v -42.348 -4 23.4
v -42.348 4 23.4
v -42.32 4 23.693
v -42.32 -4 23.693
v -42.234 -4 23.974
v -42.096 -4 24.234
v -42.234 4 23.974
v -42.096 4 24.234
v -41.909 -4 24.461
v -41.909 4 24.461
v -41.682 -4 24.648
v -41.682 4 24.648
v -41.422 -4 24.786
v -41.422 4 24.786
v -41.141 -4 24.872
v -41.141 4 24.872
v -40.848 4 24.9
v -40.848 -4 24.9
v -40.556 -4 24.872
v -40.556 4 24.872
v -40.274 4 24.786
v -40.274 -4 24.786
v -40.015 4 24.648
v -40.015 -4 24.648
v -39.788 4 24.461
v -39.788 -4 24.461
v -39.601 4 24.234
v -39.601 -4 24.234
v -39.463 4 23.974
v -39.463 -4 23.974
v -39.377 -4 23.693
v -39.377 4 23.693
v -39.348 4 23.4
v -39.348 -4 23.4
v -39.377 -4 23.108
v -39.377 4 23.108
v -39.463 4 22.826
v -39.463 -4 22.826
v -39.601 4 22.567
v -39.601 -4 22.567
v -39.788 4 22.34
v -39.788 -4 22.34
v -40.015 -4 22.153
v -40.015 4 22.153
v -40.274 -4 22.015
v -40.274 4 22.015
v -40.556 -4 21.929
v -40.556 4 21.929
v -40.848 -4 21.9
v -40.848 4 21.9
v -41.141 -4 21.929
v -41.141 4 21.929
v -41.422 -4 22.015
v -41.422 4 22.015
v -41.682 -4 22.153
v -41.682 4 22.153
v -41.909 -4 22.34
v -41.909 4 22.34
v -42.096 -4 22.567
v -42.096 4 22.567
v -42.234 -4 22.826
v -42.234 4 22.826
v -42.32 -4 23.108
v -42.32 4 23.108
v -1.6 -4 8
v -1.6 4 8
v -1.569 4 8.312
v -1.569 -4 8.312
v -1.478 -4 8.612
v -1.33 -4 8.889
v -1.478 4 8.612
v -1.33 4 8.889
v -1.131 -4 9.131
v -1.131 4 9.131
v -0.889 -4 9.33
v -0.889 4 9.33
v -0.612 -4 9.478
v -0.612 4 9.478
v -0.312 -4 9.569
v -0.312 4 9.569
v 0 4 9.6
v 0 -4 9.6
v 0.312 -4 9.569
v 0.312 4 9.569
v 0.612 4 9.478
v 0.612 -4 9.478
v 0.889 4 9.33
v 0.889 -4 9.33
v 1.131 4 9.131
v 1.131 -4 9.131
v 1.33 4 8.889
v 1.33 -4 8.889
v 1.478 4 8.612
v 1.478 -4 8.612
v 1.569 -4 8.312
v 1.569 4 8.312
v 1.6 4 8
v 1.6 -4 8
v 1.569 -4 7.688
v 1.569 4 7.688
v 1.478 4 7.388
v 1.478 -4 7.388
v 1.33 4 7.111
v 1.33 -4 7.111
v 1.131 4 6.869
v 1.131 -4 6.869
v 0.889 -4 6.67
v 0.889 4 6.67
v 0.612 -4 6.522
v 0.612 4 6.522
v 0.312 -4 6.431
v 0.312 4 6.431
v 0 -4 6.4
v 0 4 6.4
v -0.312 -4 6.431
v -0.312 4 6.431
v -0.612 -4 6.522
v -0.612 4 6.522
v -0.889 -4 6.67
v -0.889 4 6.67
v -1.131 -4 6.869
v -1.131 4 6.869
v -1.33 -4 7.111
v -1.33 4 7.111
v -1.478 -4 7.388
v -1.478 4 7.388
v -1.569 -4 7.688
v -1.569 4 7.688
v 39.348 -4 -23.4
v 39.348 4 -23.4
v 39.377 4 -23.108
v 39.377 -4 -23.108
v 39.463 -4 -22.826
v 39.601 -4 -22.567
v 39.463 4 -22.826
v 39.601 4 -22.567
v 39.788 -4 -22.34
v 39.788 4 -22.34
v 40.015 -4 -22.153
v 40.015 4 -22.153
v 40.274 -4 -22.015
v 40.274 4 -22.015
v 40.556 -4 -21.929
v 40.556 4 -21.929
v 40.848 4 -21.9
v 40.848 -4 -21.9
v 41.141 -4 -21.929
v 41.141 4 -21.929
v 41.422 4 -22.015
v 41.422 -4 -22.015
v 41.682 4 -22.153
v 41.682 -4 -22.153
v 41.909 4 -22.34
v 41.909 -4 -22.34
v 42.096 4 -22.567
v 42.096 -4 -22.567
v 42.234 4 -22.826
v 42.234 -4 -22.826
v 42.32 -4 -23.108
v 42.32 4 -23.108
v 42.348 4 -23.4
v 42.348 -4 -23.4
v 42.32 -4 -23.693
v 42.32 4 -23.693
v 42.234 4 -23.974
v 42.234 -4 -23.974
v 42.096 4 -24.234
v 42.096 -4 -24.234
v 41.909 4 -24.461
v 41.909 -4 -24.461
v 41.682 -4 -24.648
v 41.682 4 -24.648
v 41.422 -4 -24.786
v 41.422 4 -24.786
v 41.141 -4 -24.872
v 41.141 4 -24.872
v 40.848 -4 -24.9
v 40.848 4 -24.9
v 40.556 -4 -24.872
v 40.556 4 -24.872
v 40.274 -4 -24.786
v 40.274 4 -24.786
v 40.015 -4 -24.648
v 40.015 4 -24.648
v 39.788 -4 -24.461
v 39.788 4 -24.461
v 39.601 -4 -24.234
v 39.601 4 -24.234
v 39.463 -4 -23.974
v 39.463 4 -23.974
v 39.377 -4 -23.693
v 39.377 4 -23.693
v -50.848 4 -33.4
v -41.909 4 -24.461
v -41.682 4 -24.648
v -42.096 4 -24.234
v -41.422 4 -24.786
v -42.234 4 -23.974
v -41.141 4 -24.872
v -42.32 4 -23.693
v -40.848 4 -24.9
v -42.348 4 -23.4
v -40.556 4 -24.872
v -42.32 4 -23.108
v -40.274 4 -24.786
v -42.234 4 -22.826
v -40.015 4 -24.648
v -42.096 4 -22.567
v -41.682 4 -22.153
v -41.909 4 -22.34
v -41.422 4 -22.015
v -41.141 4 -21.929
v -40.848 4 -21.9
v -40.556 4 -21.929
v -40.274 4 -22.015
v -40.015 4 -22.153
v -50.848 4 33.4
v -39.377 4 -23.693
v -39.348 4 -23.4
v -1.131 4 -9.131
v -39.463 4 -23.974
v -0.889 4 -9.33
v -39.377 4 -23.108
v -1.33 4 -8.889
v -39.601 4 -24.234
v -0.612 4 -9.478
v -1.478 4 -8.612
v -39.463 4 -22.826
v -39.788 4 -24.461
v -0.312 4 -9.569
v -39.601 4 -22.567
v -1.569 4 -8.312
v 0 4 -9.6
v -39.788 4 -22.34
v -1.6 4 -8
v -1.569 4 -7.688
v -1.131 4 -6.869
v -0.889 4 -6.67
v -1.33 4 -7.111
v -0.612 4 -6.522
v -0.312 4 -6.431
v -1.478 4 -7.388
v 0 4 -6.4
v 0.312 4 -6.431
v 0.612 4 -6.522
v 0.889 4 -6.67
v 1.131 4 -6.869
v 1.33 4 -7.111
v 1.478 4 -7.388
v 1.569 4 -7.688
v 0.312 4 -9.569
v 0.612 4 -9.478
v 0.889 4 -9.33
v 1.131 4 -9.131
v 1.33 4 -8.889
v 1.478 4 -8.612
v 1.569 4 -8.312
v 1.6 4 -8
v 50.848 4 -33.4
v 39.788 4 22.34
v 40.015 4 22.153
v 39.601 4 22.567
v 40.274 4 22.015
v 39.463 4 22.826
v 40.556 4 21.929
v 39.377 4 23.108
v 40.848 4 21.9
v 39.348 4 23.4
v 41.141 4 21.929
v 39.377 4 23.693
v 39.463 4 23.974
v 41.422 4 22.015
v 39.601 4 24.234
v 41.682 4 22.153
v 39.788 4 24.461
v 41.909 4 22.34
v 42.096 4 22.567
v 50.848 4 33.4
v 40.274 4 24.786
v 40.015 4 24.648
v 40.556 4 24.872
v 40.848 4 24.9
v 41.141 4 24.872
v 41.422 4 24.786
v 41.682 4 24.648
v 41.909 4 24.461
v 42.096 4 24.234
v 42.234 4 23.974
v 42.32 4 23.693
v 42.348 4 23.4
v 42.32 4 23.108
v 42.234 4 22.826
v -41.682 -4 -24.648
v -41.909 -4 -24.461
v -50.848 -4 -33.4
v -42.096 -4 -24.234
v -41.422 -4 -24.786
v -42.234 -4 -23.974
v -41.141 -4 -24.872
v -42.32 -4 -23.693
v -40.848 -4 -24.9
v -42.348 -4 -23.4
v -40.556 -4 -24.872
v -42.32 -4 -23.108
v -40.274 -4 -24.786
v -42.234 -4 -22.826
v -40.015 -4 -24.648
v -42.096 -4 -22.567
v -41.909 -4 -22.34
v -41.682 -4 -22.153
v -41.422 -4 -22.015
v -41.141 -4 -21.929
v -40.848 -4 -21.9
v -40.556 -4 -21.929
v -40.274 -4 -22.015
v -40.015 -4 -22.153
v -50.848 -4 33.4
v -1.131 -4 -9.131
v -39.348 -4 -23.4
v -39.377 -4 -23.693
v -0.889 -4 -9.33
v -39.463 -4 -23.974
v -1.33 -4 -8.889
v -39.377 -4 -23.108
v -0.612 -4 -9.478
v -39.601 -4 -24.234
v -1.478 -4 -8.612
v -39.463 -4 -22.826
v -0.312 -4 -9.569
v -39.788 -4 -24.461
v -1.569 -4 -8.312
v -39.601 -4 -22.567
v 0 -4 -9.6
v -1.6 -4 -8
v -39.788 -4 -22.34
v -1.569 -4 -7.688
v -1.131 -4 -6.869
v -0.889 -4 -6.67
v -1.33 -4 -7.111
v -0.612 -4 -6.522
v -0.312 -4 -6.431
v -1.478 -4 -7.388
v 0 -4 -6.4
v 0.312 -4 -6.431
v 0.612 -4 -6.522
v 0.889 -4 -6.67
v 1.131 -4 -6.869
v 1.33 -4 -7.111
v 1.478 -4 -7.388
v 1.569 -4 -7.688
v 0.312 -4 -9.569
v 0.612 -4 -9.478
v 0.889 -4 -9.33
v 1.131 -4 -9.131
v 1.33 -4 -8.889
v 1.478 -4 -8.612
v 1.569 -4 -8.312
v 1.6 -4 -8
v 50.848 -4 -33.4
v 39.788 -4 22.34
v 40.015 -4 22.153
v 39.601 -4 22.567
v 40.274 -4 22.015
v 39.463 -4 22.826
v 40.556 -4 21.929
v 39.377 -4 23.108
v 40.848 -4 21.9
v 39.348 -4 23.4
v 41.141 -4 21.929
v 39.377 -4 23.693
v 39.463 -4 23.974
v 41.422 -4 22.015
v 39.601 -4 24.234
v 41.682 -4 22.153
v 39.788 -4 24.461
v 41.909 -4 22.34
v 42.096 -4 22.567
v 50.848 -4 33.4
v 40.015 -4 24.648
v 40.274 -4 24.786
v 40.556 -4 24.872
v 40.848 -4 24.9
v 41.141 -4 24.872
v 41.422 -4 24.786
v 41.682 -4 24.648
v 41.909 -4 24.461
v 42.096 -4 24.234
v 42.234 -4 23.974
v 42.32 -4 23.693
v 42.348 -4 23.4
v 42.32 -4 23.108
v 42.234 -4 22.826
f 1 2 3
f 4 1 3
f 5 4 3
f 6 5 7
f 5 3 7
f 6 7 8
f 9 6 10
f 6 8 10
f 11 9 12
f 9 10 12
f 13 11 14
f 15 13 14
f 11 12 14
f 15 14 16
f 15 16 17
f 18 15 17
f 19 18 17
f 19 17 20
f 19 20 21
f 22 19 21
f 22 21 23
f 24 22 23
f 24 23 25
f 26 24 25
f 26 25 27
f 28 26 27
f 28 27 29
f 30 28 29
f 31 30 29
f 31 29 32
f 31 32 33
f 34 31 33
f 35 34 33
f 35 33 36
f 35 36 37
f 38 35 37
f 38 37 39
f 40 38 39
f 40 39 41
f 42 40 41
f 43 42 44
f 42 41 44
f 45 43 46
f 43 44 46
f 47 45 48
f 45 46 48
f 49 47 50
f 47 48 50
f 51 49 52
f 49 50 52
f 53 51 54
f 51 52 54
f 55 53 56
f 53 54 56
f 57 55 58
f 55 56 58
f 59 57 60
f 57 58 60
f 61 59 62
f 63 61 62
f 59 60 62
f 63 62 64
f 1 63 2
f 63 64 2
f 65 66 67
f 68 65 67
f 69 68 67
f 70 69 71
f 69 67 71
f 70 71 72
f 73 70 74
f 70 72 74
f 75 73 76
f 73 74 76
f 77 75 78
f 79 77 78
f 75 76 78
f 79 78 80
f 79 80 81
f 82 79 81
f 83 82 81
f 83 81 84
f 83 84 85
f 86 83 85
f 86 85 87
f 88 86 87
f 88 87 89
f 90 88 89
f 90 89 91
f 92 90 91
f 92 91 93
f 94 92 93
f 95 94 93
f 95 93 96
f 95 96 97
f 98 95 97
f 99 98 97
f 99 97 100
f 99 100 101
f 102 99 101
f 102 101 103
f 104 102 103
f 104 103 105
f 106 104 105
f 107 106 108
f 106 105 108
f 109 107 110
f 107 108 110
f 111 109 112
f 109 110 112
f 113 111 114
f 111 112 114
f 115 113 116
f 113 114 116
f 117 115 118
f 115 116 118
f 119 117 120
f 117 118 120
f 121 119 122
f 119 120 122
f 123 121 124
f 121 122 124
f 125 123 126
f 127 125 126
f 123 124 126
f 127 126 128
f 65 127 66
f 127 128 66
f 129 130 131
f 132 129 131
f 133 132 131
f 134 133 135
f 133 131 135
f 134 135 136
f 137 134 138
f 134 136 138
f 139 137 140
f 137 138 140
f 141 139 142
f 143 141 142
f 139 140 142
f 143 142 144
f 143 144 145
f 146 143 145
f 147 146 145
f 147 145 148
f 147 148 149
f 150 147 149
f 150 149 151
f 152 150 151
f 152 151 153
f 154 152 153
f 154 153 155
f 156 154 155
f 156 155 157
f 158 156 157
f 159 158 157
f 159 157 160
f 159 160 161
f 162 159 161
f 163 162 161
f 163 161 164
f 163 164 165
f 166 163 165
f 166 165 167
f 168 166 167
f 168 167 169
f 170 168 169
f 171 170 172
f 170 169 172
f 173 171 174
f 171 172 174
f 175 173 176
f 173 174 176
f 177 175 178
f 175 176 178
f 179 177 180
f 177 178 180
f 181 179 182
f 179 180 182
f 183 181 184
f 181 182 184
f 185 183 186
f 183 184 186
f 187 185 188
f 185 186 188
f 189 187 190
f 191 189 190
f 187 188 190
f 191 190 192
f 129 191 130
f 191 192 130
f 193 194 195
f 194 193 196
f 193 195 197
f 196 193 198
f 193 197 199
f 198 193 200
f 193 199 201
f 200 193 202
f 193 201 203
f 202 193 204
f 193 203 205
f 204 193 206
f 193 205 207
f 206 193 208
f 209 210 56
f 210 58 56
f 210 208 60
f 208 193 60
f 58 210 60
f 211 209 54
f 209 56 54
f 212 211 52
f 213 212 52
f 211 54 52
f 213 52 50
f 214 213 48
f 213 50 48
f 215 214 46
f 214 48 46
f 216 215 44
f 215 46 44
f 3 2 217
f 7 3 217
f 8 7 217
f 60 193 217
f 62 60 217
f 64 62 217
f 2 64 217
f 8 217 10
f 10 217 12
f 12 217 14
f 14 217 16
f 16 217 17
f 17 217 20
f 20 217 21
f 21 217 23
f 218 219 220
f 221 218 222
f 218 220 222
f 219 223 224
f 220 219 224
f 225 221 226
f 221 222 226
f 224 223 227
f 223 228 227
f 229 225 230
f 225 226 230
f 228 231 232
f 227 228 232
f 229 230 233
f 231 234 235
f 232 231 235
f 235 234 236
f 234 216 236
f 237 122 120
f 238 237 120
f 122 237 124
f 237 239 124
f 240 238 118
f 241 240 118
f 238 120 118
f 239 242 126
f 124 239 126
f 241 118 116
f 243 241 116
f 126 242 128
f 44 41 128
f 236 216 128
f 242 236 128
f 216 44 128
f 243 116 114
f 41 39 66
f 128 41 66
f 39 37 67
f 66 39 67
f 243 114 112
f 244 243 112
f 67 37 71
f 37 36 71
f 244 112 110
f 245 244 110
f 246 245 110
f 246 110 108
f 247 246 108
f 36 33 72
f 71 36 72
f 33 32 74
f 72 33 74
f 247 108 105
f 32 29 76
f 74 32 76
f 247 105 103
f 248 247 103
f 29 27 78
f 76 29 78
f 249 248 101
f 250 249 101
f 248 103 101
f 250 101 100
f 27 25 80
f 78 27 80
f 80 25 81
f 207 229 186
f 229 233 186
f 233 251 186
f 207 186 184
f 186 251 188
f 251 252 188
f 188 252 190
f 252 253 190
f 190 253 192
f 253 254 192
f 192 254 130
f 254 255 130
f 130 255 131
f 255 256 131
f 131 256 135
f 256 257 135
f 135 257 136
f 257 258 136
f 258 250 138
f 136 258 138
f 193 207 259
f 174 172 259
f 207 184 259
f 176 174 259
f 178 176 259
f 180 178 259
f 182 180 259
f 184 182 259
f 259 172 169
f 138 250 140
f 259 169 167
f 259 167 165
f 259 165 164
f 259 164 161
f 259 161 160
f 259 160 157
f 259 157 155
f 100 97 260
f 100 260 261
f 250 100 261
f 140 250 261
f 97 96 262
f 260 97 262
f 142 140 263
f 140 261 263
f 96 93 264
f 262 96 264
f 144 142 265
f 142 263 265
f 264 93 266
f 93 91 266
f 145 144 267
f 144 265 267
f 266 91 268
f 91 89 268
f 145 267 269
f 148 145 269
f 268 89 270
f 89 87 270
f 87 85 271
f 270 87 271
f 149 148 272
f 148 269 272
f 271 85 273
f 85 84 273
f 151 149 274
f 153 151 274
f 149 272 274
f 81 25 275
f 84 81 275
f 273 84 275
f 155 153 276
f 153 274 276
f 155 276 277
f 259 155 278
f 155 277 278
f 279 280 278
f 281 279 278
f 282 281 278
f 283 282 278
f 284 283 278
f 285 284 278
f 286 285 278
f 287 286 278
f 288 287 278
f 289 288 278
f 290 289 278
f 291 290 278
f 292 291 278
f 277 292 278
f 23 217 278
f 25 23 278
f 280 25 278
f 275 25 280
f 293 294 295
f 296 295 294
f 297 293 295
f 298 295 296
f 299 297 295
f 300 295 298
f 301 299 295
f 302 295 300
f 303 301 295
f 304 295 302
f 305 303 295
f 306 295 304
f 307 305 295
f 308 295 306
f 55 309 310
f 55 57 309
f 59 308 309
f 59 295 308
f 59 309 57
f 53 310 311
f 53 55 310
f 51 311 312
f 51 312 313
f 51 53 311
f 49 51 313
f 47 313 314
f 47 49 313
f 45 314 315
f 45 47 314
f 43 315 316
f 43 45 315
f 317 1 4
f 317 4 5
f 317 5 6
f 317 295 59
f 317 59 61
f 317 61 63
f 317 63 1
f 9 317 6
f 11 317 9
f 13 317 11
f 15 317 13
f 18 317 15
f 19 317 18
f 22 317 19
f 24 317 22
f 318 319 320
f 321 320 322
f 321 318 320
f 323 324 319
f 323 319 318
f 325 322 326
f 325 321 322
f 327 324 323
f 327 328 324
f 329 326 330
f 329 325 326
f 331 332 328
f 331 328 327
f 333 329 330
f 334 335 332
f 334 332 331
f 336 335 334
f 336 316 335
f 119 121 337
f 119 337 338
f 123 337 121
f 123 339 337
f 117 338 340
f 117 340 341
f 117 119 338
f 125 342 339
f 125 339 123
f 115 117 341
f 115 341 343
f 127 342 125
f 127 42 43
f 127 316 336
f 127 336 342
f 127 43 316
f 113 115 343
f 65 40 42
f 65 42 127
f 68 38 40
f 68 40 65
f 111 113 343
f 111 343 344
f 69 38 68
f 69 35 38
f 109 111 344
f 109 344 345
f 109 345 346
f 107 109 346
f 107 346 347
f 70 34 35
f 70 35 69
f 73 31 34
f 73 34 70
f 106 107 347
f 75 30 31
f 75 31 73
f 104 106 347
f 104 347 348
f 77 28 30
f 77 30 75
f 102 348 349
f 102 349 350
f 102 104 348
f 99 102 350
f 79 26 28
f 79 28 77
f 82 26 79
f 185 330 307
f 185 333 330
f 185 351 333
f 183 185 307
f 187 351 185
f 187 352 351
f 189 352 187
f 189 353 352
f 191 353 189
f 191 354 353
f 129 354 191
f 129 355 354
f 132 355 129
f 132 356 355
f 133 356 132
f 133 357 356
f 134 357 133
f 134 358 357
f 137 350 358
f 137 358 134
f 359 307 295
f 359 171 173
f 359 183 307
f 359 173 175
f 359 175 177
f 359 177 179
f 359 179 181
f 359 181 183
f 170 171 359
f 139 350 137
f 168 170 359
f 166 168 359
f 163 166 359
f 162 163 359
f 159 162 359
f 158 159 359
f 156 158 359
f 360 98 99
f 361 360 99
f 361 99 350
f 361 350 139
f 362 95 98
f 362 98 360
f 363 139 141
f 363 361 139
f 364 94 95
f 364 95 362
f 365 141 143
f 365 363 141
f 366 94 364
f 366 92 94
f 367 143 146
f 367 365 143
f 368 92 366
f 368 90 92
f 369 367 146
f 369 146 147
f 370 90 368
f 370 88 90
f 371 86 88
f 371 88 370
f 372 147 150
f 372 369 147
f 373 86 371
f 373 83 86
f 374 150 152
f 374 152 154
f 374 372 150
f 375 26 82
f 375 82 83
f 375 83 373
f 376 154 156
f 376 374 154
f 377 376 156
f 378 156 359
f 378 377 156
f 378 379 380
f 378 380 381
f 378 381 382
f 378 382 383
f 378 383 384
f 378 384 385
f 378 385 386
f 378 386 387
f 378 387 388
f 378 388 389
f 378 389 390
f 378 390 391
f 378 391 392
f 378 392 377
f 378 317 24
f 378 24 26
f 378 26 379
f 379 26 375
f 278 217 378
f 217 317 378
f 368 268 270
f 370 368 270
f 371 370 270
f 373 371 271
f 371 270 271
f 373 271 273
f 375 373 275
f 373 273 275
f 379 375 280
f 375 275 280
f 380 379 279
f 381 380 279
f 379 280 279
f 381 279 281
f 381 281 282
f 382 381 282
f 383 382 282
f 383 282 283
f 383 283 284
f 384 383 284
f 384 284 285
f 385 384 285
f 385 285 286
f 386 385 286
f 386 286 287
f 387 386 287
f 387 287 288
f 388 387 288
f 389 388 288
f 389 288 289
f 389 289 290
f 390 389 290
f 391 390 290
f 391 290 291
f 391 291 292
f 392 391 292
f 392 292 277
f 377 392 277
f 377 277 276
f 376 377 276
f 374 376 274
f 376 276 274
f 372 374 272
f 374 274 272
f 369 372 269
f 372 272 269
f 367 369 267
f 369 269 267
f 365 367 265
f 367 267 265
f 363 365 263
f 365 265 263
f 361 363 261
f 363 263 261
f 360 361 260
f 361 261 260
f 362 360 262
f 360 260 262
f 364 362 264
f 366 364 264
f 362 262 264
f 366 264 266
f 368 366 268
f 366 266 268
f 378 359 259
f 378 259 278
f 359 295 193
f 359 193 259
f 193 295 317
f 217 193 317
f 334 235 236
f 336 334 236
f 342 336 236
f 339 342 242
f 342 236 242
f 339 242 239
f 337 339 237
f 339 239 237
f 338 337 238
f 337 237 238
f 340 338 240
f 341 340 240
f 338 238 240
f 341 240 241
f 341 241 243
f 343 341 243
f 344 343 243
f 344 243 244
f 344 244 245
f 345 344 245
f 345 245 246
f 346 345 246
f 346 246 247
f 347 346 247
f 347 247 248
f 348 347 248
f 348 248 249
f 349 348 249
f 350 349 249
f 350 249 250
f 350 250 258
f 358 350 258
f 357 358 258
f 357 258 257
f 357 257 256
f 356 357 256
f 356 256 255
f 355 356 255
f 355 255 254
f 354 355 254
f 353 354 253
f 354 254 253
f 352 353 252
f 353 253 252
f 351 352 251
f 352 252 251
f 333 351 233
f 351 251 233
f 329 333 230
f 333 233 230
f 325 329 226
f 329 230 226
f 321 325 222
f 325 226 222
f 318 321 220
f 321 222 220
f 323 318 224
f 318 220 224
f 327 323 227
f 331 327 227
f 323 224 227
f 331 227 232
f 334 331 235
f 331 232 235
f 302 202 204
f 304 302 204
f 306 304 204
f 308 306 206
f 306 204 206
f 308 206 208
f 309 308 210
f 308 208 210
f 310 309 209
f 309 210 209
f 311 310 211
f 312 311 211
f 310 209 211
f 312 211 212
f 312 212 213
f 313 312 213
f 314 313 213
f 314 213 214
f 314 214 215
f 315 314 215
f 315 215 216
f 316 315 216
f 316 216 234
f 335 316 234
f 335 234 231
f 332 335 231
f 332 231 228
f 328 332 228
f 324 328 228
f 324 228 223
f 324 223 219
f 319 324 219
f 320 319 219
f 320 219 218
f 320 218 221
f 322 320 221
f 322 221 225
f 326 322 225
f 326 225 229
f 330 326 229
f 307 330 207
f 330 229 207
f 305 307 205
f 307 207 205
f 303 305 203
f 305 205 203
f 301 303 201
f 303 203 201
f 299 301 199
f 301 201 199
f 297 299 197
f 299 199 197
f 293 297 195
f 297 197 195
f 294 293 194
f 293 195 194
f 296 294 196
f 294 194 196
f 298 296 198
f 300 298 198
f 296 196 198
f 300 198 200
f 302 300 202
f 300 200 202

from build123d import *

# Parameters (mm, degrees)
F0_W     = 101.69682
F0_H     = 66.800862
F1_DEPTH = 4
F3_D     = 3
F4_D     = 3.2


with BuildPart() as f1:
    # F0 (on Front) → F1 (new body, symmetric)
    with BuildSketch(Plane.XZ):
        Rectangle(F0_W, F0_H)
    extrude(amount=F1_DEPTH, both=True)

    # F3 (through all)
    with Locations(Plane.XZ.offset(4)):
        with Locations((-40.84841, 23.400431), (40.84841, 23.400431), (40.84841, -23.400431), (-40.84841, -23.400431)):
            Hole(F3_D / 2)

    # F4 (through all)
    with Locations(Plane.XZ.offset(4)):
        with Locations((0, 8), (0, -8)):
            Hole(F4_D / 2)


solid = f1.part
